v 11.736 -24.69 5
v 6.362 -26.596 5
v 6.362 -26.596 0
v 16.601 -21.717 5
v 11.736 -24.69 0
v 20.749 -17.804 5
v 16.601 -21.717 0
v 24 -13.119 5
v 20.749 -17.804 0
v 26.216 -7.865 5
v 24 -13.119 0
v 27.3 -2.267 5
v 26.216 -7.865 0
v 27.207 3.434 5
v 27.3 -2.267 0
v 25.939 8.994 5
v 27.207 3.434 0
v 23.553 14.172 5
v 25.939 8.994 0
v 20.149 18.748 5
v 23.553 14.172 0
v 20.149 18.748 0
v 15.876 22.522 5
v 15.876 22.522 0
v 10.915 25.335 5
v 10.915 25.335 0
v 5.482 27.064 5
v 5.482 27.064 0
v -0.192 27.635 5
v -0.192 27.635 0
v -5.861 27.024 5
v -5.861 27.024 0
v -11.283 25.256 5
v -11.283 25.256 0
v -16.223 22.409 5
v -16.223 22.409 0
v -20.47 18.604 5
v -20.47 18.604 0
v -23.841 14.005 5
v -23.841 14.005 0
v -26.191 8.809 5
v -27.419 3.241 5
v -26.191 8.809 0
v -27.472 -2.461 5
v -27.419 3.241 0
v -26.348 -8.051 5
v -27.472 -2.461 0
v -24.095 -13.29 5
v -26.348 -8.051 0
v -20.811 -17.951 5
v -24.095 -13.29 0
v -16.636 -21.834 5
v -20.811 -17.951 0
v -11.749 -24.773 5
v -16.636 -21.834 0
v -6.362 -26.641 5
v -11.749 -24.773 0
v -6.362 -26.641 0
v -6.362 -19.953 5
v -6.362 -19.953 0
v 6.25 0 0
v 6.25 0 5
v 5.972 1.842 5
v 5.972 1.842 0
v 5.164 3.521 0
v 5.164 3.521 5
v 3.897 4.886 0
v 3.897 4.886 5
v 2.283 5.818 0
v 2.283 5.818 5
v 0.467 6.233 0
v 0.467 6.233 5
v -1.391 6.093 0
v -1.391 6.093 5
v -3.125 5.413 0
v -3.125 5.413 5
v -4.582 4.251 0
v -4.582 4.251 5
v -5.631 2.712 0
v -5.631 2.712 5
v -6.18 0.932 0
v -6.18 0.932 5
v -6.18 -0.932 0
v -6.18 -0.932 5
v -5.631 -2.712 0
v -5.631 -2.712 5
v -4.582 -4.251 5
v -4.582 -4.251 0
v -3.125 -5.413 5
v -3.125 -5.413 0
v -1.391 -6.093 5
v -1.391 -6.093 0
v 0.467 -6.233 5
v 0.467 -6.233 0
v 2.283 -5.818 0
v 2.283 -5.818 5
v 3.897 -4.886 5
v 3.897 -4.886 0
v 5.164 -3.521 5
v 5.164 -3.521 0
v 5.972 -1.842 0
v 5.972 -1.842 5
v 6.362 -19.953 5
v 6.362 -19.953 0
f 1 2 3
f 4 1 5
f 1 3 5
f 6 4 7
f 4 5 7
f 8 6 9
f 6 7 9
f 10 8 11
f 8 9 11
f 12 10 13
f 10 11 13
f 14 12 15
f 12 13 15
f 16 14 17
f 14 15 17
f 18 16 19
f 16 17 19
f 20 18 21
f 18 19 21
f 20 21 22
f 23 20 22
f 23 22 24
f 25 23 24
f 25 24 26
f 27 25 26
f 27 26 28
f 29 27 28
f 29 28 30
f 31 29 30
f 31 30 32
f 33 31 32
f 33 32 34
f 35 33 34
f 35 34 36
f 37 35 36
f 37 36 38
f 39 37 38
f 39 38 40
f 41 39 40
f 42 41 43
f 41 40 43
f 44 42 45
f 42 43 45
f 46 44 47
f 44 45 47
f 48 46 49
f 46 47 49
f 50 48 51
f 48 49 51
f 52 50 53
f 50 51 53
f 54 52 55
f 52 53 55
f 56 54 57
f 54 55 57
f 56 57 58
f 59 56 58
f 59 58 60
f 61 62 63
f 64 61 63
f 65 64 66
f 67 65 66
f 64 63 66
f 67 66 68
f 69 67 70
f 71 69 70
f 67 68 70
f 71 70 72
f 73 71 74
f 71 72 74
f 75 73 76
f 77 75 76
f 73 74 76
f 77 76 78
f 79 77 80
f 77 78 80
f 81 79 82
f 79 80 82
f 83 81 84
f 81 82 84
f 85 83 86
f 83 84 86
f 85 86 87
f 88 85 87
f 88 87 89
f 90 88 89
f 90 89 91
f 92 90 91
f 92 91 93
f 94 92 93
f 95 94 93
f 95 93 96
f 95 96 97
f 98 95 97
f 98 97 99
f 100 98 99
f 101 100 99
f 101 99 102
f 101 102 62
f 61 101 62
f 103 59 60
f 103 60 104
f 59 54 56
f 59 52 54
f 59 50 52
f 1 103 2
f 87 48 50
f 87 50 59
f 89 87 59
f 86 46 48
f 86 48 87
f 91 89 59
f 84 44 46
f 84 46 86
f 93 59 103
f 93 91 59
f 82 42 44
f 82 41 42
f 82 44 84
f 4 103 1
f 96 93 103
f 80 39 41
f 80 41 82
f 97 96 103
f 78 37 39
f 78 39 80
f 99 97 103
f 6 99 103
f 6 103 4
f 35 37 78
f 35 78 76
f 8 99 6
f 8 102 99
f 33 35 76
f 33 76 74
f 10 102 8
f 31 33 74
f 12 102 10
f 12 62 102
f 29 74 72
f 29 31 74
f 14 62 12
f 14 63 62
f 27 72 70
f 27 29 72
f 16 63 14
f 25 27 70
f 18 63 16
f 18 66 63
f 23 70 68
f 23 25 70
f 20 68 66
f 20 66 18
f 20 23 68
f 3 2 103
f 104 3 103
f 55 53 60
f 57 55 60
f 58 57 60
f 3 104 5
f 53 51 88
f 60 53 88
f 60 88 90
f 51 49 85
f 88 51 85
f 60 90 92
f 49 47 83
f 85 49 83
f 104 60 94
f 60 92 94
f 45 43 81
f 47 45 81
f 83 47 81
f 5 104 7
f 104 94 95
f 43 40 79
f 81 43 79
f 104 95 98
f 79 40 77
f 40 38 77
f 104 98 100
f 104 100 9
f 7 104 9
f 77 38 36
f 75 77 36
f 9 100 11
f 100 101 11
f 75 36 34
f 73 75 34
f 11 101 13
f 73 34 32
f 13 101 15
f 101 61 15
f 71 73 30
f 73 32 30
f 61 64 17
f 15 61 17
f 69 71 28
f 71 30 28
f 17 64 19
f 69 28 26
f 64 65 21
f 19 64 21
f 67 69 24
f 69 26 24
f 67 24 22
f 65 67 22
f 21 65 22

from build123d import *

# Parameters (mm, degrees)
F0_R     = 27.5
F1_DEPTH = 5
F2_R     = 6.25
F3_DEPTH = 25
F4_W     = 9.638923
F4_H     = 7.71114
F5_DEPTH = 5
F6_W     = 12.723378
F6_H     = 9.831702
F7_DEPTH = 25


with BuildPart() as f1:
    # F0 (on Top) → F1 (new body)
    with BuildSketch(Plane.XY):
        with Locations((-0.094615, 0.134945)):
            Circle(F0_R)
    extrude(amount=F1_DEPTH)

    # F2 (on face) → F3 (cut)
    with BuildSketch(Plane.XY.offset(5)):
        Circle(F2_R)
    extrude(amount=-F3_DEPTH, mode=Mode.SUBTRACT)

    # F4 (on face) → F5 (cut)
    with BuildSketch(Plane.XY.offset(5)):
        with Locations((0.578336, -24.772032)):
            Rectangle(F4_W, F4_H)
    extrude(amount=-F5_DEPTH, mode=Mode.SUBTRACT)

    # F6 (on face) → F7 (cut)
    with BuildSketch(Plane.XY.offset(5)):
        with Locations((-1e-06, -24.868422)):
            Rectangle(F6_W, F6_H)
    extrude(amount=-F7_DEPTH, mode=Mode.SUBTRACT)


solid = f1.part
